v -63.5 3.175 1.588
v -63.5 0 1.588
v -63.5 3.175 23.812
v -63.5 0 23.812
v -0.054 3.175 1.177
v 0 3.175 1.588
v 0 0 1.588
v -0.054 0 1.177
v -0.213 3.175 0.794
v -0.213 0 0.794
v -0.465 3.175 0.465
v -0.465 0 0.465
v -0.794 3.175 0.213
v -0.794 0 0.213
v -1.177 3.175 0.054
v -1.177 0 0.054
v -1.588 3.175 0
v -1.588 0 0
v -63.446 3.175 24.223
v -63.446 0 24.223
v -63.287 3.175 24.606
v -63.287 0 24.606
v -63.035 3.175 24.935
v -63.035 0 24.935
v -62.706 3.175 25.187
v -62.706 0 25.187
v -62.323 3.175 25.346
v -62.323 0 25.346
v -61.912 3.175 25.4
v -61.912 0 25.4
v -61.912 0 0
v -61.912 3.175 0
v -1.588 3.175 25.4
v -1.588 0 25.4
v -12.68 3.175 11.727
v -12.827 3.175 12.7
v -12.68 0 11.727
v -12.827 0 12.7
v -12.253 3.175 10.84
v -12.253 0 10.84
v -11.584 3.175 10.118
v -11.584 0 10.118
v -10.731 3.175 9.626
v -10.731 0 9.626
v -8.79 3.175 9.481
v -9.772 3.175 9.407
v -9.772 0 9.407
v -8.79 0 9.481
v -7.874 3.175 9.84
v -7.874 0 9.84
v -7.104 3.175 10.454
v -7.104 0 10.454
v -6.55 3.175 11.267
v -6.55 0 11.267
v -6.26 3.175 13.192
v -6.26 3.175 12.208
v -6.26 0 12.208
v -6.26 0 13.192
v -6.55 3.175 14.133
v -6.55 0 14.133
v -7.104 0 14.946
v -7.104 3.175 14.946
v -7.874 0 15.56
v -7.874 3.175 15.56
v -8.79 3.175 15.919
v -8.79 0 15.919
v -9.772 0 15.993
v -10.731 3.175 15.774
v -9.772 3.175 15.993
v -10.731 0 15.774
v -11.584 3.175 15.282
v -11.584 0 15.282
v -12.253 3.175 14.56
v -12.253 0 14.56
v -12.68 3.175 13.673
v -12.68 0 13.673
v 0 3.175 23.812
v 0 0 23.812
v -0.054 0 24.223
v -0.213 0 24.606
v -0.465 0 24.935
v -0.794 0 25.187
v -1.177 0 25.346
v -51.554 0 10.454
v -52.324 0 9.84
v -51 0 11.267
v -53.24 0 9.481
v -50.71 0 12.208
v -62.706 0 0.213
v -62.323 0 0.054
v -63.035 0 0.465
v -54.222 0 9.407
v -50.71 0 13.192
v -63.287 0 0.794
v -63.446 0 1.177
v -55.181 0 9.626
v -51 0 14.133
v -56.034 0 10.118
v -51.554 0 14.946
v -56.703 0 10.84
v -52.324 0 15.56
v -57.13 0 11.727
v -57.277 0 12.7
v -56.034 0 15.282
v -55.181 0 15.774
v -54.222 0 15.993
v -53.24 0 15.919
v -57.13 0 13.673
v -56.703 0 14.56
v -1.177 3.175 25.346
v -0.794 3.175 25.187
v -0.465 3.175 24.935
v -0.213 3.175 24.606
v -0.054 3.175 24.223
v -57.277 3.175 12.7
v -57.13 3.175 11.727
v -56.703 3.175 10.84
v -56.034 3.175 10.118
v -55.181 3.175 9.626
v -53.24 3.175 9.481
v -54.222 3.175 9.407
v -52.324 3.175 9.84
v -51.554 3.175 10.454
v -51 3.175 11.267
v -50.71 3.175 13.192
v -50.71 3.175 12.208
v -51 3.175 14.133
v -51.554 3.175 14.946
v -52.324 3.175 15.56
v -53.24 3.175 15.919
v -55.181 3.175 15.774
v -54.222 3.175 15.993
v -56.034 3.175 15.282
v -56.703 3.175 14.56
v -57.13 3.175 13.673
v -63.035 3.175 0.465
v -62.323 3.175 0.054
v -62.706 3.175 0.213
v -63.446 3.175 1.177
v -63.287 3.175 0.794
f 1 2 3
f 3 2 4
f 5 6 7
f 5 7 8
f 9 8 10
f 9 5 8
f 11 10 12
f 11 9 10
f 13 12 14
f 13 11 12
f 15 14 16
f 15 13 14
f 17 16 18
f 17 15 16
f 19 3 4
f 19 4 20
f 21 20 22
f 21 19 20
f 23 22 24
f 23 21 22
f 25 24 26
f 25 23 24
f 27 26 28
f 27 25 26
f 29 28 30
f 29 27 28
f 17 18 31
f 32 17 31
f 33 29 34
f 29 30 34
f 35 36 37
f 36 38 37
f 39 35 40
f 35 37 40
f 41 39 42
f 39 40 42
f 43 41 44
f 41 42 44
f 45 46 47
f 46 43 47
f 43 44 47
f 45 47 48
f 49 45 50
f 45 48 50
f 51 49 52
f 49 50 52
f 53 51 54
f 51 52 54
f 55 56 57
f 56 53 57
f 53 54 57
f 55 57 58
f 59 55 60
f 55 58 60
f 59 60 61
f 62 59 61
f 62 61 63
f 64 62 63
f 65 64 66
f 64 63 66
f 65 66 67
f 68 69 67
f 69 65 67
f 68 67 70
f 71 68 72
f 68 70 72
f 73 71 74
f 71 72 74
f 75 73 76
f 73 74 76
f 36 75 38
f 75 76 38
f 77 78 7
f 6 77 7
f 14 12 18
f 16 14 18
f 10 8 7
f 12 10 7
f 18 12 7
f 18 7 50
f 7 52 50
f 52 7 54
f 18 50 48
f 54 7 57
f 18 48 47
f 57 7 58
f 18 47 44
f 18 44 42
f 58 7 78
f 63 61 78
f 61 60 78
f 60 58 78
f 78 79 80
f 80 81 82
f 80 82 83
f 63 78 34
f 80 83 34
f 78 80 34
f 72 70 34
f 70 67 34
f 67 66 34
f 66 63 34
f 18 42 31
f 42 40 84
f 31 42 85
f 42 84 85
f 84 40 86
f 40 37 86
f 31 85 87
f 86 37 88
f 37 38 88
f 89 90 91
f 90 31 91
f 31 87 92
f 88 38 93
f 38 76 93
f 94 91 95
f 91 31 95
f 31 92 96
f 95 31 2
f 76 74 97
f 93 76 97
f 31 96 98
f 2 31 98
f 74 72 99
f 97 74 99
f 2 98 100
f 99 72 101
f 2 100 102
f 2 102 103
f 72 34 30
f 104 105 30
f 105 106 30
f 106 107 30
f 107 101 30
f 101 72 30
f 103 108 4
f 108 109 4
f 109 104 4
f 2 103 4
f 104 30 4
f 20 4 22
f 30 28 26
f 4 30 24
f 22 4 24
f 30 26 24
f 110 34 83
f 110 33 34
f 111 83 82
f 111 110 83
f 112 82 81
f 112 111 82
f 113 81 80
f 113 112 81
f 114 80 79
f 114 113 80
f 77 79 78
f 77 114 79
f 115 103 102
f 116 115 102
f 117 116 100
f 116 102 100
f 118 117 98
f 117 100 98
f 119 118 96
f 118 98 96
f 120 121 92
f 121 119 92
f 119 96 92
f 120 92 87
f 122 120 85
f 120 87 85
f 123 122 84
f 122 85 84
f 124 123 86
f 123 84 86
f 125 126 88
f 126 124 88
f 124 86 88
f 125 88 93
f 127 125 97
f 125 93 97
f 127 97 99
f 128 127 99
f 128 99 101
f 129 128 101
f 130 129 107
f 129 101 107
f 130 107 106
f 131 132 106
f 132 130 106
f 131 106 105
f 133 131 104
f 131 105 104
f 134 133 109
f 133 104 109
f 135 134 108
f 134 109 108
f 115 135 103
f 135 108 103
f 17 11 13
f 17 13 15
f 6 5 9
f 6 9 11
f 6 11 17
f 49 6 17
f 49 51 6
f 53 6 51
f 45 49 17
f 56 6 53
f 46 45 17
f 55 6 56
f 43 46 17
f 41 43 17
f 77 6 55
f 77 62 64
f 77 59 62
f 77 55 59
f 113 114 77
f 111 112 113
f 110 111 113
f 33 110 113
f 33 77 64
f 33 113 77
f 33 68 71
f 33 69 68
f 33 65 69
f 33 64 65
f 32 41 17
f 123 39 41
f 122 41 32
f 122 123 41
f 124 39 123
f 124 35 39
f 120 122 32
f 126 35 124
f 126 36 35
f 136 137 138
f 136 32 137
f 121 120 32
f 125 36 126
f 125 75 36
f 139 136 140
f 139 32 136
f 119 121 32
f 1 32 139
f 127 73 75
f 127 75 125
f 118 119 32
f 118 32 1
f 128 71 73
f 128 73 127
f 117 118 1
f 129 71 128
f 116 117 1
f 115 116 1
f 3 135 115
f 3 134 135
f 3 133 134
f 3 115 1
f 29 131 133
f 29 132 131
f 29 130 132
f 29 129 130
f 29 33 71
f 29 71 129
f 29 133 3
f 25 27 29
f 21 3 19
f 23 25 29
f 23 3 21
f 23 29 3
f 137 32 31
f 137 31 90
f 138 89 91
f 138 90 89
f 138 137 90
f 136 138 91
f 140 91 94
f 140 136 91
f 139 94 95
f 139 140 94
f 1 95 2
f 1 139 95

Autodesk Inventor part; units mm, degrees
ref_plane "YZ Plane" through (0, 0, 0) normal (1, 0, 0) x (0, 1, 0)
ref_plane "XZ Plane" through (0, 0, 0) normal (0, 1, 0) x (-1, 0, 0)
ref_plane "XY Plane" through (0, 0, 0) normal (0, 0, 1) x (1, 0, 0)
sketch "Sketch1" plane through (0, 0, 0) normal (0, 1, 0) x (-1, 0, 0)
  line L0 (0, 0) -> (63.5, 0)
  line L1 (63.5, 0) -> (63.5, 25.4)
  line L2 (63.5, 25.4) -> (0, 25.4)
  line L3 (0, 25.4) -> (0, 0)
  circle A0 centre (9.525, 12.7) radius 3.302
  circle A1 centre (53.975, 12.7) radius 3.302
  line L4 (9.525, 12.7) -> (53.975, 12.7) construction
  line L5 (31.75, 25.4) -> (31.75, 0) construction
  point P0 (31.75, 12.7)
  dimension "d0" = 63.5
  dimension "d2" = 25.4
  dimension "d3" = 44.45
  dimension "d4" = 6.604
extrude "Extrusion1" add sketch "Sketch1" along normal blind 3.175
fillet "Fillet1" radius 1.5875 4 edges at (0, 1.5875, 25.4) (0, 1.5875, 0) (-63.5, 1.5875, 0) (-63.5, 1.5875, 25.4)
properties part number "Wheel Mount Support Plate" material "Aluminum 6061"
